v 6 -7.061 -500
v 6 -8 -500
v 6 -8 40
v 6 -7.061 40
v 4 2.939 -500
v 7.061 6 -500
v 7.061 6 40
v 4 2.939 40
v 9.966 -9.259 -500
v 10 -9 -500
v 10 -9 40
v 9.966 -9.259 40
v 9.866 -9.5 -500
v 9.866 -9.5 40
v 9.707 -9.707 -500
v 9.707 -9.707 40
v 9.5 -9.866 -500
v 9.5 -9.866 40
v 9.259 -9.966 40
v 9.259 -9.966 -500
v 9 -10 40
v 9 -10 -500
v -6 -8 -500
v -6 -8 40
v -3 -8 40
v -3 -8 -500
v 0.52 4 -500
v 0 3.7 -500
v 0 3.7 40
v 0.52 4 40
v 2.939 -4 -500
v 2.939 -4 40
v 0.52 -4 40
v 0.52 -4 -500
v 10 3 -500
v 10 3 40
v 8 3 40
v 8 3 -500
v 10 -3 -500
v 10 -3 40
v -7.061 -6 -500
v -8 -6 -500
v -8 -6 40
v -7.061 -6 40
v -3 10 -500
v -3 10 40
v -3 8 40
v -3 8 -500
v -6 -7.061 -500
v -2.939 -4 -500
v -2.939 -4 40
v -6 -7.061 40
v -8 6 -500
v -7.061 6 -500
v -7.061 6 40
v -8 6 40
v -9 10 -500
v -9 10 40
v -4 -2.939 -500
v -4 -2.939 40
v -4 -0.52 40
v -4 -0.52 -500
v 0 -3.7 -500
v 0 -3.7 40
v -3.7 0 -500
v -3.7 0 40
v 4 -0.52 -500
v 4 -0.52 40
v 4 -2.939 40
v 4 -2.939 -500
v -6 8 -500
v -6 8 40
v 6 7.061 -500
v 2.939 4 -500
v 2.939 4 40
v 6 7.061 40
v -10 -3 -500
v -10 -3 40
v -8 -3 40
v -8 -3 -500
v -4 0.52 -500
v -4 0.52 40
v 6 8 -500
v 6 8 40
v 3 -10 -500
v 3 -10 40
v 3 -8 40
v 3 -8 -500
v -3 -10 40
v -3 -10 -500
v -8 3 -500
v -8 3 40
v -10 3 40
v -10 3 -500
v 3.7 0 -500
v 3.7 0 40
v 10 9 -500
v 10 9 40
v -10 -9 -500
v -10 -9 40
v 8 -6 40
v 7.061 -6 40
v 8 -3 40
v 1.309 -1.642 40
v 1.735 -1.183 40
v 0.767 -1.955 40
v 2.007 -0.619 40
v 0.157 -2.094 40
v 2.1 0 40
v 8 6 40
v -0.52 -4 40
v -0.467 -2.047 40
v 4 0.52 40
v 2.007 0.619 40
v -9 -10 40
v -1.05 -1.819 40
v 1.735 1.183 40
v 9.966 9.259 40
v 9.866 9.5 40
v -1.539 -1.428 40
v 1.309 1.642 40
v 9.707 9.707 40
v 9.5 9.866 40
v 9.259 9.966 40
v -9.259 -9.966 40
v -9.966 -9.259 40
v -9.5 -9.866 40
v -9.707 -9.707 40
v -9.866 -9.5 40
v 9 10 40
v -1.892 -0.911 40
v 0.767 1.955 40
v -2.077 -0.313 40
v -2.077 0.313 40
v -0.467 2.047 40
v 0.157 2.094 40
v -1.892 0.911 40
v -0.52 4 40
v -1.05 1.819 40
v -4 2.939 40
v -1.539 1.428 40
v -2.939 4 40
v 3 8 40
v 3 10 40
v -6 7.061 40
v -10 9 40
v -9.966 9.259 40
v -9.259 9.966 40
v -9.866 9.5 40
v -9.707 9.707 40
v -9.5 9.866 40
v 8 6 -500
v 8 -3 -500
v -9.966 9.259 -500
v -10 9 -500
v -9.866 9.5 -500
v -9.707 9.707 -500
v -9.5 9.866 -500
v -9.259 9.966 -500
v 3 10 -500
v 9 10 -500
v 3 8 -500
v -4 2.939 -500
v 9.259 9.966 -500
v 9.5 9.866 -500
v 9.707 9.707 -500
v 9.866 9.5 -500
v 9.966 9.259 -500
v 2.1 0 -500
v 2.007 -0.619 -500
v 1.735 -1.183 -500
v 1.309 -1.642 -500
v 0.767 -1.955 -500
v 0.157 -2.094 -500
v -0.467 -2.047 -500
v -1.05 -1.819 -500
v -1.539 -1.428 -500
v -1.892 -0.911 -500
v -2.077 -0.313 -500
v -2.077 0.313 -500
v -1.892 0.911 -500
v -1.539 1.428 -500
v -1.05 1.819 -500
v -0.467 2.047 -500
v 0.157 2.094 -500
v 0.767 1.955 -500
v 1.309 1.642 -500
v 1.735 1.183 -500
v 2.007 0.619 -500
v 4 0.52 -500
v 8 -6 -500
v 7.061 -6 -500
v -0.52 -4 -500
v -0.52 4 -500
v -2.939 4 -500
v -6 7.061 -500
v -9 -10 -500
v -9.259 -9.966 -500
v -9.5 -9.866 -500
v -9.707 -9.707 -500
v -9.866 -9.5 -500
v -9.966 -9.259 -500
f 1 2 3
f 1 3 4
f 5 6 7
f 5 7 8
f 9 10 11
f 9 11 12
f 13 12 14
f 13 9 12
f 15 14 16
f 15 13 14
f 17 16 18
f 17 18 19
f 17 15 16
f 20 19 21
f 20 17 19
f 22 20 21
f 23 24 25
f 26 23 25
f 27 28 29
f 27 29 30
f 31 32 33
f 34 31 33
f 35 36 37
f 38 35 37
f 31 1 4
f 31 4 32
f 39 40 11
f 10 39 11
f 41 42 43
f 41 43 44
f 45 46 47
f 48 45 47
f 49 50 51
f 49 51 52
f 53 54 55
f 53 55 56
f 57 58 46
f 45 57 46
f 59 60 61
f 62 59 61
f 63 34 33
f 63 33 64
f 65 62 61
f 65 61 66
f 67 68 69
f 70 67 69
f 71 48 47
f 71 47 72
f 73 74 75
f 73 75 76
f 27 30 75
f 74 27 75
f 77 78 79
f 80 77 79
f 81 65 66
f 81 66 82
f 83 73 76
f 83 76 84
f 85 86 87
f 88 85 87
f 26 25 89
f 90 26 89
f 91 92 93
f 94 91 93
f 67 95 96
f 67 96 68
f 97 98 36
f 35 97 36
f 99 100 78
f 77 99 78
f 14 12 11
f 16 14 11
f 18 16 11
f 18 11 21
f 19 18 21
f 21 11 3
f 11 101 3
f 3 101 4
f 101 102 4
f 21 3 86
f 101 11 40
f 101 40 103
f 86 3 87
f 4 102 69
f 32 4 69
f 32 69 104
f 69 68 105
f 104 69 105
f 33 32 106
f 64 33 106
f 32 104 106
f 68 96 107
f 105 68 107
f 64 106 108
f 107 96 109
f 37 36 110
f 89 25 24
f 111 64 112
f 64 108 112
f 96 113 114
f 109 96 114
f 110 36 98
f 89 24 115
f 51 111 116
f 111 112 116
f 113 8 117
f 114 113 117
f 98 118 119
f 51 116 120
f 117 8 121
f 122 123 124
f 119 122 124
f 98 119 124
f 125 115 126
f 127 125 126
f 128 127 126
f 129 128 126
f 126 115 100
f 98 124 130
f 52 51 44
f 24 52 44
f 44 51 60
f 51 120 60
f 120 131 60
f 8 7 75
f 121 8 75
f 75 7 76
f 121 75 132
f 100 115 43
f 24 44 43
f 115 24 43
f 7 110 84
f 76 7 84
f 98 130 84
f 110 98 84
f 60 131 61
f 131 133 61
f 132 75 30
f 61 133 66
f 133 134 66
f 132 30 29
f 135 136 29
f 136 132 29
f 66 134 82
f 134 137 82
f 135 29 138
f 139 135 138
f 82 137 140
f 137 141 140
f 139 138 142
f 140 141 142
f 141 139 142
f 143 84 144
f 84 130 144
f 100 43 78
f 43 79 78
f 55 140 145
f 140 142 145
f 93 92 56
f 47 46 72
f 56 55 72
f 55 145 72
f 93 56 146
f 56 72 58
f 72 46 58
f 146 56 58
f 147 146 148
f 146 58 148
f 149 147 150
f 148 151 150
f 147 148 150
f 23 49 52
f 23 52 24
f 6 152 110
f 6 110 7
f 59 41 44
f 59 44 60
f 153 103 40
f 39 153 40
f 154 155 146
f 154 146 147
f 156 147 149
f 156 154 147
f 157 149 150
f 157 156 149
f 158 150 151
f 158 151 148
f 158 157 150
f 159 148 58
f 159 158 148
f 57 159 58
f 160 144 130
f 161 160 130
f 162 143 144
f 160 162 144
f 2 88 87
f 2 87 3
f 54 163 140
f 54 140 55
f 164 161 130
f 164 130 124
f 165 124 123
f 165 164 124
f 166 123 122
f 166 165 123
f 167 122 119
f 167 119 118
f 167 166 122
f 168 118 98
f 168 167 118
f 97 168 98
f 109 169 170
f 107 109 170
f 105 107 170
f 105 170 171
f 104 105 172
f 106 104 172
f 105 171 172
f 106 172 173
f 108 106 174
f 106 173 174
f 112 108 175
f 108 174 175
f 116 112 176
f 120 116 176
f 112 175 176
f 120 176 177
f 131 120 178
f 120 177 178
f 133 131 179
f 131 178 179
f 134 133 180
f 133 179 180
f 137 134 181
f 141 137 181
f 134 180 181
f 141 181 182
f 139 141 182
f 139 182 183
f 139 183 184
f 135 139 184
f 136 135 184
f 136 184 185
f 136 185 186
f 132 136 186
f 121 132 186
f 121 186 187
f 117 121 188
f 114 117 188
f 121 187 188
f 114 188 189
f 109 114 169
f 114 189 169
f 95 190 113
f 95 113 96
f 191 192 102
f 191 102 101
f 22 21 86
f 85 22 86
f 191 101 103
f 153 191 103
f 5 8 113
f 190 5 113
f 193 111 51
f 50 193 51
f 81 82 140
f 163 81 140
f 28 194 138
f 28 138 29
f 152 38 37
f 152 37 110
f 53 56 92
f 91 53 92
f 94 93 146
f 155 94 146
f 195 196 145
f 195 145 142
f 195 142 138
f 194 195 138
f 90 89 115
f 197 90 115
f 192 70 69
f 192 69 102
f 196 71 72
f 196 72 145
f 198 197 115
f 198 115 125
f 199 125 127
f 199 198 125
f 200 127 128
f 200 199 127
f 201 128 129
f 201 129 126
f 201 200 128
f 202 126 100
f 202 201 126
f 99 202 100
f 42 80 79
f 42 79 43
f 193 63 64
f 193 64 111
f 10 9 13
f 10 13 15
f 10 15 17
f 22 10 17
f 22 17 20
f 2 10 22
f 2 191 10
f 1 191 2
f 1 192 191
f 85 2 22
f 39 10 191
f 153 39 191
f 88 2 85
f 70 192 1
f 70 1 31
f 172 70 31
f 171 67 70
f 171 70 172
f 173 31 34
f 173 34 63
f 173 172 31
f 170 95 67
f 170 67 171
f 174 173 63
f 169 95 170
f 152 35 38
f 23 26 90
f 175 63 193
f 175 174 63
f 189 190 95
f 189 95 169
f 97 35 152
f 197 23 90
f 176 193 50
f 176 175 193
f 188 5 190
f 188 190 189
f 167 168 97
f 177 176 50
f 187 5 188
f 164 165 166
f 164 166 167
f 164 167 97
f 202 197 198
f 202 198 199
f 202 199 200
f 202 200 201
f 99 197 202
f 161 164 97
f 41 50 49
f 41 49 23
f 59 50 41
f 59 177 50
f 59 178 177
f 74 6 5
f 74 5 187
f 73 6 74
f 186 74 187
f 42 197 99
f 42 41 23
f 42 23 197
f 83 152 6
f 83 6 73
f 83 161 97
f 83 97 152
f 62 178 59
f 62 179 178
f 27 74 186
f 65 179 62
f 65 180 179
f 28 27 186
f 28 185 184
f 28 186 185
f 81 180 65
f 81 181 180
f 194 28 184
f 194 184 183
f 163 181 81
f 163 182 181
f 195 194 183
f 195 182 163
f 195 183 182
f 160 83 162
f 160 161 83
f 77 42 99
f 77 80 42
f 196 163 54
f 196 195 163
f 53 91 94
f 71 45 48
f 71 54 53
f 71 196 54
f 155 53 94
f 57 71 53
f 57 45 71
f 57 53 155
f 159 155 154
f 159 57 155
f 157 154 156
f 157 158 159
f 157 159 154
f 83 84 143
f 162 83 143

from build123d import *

# Parameters (mm, degrees)
SKETCH1_R           = 2.1
BOSS_EXTRUDE1_DEPTH = 540


with BuildPart() as part:
    # Sketch1 → Boss-Extrude1 (new body)
    with BuildSketch(Plane(origin=(0, 0, -500), x_dir=(-1, 0, 0), z_dir=(0, 0, -1))):
        with BuildLine():
            Line((9, 10), (3, 10))
            Line((3, 10), (3, 8))
            Line((3, 8), (6, 8))
            Line((6, 8), (6, 7.060660172))
            Line((6, 7.060660172), (2.939339828, 4))
            Line((2.939339828, 4), (0.519615242, 4))
            Line((0.519615242, 4), (0, 3.7))
            Line((0, 3.7), (-0.519615242, 4))
            Line((-0.519615242, 4), (-2.939339828, 4))
            Line((-2.939339828, 4), (-6, 7.060660172))
            Line((-6, 7.060660172), (-6, 8))
            Line((-6, 8), (-3, 8))
            Line((-3, 8), (-3, 10))
            Line((-3, 10), (-9, 10))
            ThreePointArc((-9, 10), (-9.707106781, 9.707106781), (-10, 9))
            Line((-10, 9), (-10, 3))
            Line((-10, 3), (-8, 3))
            Line((-8, 3), (-8, 6))
            Line((-8, 6), (-7.060660172, 6))
            Line((-7.060660172, 6), (-4, 2.939339828))
            Line((-4, 2.939339828), (-4, 0.519615242))
            Line((-4, 0.519615242), (-3.7, 0))
            Line((-3.7, 0), (-4, -0.519615242))
            Line((-4, -0.519615242), (-4, -2.939339828))
            Line((-4, -2.939339828), (-7.060660172, -6))
            Line((-7.060660172, -6), (-8, -6))
            Line((-8, -6), (-8, -3))
            Line((-8, -3), (-10, -3))
            Line((-10, -3), (-10, -9))
            ThreePointArc((-10, -9), (-9.707106781, -9.707106781), (-9, -10))
            Line((-9, -10), (-3, -10))
            Line((-3, -10), (-3, -8))
            Line((-3, -8), (-6, -8))
            Line((-6, -8), (-6, -7.060660172))
            Line((-6, -7.060660172), (-2.939339828, -4))
            Line((-2.939339828, -4), (-0.519615242, -4))
            Line((-0.519615242, -4), (0, -3.7))
            Line((0, -3.7), (0.519615242, -4))
            Line((0.519615242, -4), (2.939339828, -4))
            Line((2.939339828, -4), (6, -7.060660172))
            Line((6, -7.060660172), (6, -8))
            Line((6, -8), (3, -8))
            Line((3, -8), (3, -10))
            Line((3, -10), (9, -10))
            ThreePointArc((9, -10), (9.707106781, -9.707106781), (10, -9))
            Line((10, -9), (10, -3))
            Line((10, -3), (8, -3))
            Line((8, -3), (8, -6))
            Line((8, -6), (7.060660172, -6))
            Line((7.060660172, -6), (4, -2.939339828))
            Line((4, -2.939339828), (4, -0.519615242))
            Line((4, -0.519615242), (3.7, 0))
            Line((3.7, 0), (4, 0.519615242))
            Line((4, 0.519615242), (4, 2.939339828))
            Line((4, 2.939339828), (7.060660172, 6))
            Line((7.060660172, 6), (8, 6))
            Line((8, 6), (8, 3))
            Line((8, 3), (10, 3))
            Line((10, 3), (10, 9))
            ThreePointArc((10, 9), (9.707106781, 9.707106781), (9, 10))
        make_face()
        with Locations(Location((0, 0, 0), (0, 0, 180))):
            Circle(SKETCH1_R, mode=Mode.SUBTRACT)
    extrude(amount=-BOSS_EXTRUDE1_DEPTH)


solid = part.part
